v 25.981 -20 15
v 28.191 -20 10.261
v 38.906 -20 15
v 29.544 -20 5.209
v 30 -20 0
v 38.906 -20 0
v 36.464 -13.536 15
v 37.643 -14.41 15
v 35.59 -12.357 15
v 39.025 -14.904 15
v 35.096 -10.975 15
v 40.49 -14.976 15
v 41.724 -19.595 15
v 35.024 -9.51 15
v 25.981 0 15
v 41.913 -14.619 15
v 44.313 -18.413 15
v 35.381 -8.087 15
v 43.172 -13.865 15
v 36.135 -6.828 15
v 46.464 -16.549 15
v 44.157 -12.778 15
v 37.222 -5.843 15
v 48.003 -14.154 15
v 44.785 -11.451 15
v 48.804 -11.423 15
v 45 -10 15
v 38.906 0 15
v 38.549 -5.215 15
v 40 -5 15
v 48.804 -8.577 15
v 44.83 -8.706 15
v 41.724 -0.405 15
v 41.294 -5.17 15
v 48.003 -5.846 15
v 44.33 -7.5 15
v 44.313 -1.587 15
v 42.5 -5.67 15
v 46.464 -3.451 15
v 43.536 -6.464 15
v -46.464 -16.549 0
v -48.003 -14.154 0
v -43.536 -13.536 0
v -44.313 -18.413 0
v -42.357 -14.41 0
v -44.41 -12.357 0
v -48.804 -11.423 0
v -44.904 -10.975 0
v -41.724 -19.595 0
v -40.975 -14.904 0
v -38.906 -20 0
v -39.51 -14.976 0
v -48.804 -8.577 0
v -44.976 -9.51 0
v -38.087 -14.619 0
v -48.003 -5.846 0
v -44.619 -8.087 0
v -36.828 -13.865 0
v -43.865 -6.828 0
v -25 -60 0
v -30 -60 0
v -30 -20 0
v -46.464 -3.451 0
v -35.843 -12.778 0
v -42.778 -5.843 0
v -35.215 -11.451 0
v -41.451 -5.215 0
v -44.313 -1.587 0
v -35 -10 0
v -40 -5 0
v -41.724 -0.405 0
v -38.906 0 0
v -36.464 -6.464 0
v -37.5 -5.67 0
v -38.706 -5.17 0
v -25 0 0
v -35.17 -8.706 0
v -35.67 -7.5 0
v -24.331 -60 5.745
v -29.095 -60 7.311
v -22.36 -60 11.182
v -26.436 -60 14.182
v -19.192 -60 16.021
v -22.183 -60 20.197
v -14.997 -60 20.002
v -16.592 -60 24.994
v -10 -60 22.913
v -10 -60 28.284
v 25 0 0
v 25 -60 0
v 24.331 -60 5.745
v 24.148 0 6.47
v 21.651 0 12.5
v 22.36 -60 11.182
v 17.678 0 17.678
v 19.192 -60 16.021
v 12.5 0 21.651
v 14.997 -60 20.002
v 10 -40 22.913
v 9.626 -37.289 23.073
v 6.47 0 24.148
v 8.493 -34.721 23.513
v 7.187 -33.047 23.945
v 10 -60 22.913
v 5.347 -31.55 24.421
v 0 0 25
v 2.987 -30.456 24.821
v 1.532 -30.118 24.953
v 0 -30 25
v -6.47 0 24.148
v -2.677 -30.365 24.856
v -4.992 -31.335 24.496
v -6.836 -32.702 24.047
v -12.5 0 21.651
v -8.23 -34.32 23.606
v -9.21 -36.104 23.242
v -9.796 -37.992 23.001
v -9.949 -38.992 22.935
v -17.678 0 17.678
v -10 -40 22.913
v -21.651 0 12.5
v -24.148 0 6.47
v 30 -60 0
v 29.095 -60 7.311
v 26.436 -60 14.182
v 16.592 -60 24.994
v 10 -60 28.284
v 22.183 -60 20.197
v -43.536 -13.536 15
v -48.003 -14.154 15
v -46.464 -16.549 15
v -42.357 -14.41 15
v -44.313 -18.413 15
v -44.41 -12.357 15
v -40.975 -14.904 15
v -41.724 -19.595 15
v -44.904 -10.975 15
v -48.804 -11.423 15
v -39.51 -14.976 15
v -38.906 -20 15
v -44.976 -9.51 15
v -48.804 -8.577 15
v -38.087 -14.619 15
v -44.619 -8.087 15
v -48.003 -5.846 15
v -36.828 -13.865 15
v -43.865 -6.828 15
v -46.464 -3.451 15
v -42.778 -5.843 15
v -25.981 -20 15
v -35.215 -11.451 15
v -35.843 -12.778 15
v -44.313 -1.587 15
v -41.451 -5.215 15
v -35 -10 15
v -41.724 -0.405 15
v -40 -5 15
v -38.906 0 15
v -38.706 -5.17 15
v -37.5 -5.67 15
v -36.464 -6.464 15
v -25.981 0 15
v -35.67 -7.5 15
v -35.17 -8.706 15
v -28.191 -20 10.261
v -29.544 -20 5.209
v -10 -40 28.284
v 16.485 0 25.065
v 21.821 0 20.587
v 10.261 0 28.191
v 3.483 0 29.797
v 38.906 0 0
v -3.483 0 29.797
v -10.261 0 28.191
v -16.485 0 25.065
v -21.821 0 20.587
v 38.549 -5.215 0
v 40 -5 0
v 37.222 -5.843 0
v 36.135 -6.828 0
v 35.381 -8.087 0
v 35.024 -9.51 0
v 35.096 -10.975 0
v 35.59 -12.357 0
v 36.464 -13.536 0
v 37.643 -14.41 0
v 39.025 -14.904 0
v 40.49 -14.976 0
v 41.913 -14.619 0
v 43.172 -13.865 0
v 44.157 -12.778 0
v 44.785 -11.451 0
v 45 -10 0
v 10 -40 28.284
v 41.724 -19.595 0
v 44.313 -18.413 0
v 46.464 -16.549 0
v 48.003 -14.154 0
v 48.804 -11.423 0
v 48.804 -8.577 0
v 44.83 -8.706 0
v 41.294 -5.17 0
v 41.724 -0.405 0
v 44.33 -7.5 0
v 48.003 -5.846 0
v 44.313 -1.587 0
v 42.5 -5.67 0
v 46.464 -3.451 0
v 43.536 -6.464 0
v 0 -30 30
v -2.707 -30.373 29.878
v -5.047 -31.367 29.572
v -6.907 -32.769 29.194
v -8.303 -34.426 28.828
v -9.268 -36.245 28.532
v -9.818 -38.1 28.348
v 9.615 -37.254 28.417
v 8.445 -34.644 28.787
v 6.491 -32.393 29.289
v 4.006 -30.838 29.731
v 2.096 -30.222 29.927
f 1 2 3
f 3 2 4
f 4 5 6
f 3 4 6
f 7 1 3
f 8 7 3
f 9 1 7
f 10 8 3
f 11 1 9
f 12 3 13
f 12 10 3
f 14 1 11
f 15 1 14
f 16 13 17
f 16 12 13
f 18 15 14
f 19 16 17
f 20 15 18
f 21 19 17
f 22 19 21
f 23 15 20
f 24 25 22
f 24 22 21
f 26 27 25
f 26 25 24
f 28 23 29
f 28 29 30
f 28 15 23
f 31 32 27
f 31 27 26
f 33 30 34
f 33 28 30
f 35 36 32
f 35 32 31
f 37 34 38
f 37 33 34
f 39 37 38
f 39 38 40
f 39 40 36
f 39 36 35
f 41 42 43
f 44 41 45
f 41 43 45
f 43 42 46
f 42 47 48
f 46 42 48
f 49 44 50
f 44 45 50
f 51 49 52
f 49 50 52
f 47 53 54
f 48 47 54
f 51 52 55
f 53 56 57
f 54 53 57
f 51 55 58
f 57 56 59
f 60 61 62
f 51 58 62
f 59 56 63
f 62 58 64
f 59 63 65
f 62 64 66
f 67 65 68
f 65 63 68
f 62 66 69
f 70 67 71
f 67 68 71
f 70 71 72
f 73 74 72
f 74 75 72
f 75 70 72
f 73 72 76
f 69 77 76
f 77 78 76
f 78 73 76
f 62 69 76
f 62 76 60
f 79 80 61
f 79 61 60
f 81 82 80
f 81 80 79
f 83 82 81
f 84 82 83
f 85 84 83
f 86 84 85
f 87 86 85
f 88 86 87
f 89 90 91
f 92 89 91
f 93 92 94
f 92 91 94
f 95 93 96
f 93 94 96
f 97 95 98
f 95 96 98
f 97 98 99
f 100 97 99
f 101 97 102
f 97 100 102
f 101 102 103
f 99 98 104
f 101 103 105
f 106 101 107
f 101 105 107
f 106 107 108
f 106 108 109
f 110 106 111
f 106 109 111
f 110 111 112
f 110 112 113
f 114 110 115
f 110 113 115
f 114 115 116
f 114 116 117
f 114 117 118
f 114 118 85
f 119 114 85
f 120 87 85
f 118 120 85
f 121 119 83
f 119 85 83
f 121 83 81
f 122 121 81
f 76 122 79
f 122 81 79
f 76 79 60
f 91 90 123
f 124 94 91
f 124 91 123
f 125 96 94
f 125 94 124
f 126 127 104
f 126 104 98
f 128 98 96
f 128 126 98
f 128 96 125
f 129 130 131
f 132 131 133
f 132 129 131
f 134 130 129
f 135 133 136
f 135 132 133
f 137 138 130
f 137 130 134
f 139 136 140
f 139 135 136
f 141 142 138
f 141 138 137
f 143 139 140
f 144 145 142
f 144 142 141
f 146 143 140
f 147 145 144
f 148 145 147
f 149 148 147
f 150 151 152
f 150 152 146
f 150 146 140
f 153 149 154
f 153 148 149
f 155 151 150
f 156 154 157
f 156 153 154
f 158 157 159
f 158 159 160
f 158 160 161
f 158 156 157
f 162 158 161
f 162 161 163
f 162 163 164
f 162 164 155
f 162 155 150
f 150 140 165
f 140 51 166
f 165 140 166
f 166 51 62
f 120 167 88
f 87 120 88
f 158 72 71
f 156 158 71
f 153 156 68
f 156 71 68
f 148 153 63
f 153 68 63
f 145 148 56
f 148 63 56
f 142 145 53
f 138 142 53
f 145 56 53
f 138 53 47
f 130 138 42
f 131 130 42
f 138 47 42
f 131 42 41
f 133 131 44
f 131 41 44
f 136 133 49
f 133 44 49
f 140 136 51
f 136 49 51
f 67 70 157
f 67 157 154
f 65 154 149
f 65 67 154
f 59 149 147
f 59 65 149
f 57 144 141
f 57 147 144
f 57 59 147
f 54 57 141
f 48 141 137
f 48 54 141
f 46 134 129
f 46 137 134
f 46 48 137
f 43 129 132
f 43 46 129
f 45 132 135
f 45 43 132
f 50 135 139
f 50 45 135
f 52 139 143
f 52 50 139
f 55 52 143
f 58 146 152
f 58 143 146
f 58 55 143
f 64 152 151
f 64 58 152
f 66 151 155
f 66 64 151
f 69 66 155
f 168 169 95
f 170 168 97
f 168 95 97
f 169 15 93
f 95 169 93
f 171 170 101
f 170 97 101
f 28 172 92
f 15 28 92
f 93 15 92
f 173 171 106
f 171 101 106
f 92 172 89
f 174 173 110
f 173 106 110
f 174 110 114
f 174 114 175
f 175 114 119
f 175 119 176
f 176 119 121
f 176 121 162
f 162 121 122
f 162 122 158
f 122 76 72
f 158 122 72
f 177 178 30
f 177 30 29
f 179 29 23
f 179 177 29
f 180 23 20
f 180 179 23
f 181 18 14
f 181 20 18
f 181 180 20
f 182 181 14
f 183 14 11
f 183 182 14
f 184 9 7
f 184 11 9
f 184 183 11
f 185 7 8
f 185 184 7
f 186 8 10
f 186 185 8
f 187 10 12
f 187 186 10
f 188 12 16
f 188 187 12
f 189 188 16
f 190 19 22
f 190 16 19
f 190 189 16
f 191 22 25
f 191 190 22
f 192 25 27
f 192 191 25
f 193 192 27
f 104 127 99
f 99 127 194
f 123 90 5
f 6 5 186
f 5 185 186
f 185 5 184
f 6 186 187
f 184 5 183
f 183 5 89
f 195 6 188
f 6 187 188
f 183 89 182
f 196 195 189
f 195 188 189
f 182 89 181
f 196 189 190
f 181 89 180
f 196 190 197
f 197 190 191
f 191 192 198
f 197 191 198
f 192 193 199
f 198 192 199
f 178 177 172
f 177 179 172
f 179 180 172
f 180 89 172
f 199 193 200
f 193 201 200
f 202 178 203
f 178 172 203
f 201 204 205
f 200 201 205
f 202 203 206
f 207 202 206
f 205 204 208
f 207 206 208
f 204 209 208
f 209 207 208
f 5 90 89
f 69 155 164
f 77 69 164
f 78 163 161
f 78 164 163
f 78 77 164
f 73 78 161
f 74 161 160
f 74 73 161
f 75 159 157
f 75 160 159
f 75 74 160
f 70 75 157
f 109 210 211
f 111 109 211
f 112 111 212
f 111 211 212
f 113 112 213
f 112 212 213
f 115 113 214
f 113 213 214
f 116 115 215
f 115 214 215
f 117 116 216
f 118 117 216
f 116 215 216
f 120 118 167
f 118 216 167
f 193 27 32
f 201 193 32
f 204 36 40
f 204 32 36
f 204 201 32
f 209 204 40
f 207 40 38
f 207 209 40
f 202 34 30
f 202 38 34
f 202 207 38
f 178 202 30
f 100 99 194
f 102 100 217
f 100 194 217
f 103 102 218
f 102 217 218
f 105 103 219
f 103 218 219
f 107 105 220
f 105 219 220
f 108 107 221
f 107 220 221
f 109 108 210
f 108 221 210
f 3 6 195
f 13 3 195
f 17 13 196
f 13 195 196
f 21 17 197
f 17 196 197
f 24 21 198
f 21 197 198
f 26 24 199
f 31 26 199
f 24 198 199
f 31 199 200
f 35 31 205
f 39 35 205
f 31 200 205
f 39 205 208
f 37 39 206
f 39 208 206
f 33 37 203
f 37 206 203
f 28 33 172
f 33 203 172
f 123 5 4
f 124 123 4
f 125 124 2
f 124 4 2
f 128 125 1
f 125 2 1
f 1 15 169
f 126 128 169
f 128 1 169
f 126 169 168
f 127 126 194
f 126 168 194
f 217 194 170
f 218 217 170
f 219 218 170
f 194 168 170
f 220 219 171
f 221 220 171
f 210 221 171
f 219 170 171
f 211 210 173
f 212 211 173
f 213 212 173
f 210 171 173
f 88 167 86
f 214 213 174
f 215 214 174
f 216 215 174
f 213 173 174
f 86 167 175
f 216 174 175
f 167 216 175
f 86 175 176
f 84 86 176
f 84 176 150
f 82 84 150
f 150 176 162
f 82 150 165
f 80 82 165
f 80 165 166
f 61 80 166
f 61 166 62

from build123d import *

# Parameters (mm, degrees)
F1_R      = 30
F2_DEPTH  = 60
F4_DEPTH  = 60
F6_DEPTH  = 15
F8_DEPTH  = 60
F10_DEPTH = 30.001
F14_DEPTH = 30.001


with BuildPart() as f2:
    # F1 (on Front) → F2 (new body)
    with BuildSketch(Plane.XZ):
        Circle(F1_R)
    extrude(amount=F2_DEPTH)

    # F3 (on face) → F4 (cut, through all)
    with BuildSketch(Plane.XZ.offset(60)):
        with BuildLine():
            Line((30, 0), (-30, 0))
            ThreePointArc((-30, 0), (0, -30.0890051065), (30, 0))
        make_face()
    extrude(amount=-F4_DEPTH, mode=Mode.SUBTRACT)

    # F5 (on Top) → F6 (join)
    with BuildSketch(Plane.XY):
        with BuildLine():
            ThreePointArc((-38.9062538743, 0), (-48.9062538743, -10), (-38.9062538743, -20))
            Line((-38.9062538743, -20), (38.9062538743, -20))
            ThreePointArc((38.9062538743, -20), (48.9062538743, -10), (38.9062538743, 0))
            Line((38.9062538743, 0), (-38.9062538743, 0))
        make_face()
    extrude(amount=F6_DEPTH)

    # F7 (on face) → F8 (cut, through all)
    with BuildSketch(Plane.XZ.offset(60)):
        with BuildLine():
            Line((-25, 0), (25, 0))
            ThreePointArc((25, 0), (0, 25), (-25, 0))
        make_face()
    extrude(amount=-F8_DEPTH, mode=Mode.SUBTRACT)

    # F9 (on Top) → F10 (cut, through all)
    with BuildSketch(Plane.XY):
        with BuildLine():
            ThreePointArc((-35, -10), (-36.4644660941, -6.4644660941), (-40, -5))
            ThreePointArc((-40, -5), (-43.5355339059, -13.5355339059), (-35, -10))
        make_face()
        with BuildLine():
            ThreePointArc((45, -10), (43.5355339059, -6.4644660941), (40, -5))
            ThreePointArc((40, -5), (36.4644660941, -13.5355339059), (45, -10))
        make_face()
    extrude(amount=F10_DEPTH, mode=Mode.SUBTRACT)

    # F13 (on plane+point) → F14 (cut, through all)
    with BuildSketch(Plane.XY.offset(30)):
        with BuildLine():
            ThreePointArc((10, -40), (7.0710678119, -32.9289321881), (0, -30))
            Line((0, -30), (0, -60))
            Line((0, -60), (10, -60))
            Line((10, -60), (10, -40))
        make_face()
        with BuildLine():
            Line((0, -60), (0, -30))
            ThreePointArc((0, -30), (-7.0710678119, -32.9289321881), (-10, -40))
            Line((-10, -40), (-10, -60))
            Line((-10, -60), (0, -60))
        make_face()
    extrude(amount=-F14_DEPTH, mode=Mode.SUBTRACT)


solid = f2.part
